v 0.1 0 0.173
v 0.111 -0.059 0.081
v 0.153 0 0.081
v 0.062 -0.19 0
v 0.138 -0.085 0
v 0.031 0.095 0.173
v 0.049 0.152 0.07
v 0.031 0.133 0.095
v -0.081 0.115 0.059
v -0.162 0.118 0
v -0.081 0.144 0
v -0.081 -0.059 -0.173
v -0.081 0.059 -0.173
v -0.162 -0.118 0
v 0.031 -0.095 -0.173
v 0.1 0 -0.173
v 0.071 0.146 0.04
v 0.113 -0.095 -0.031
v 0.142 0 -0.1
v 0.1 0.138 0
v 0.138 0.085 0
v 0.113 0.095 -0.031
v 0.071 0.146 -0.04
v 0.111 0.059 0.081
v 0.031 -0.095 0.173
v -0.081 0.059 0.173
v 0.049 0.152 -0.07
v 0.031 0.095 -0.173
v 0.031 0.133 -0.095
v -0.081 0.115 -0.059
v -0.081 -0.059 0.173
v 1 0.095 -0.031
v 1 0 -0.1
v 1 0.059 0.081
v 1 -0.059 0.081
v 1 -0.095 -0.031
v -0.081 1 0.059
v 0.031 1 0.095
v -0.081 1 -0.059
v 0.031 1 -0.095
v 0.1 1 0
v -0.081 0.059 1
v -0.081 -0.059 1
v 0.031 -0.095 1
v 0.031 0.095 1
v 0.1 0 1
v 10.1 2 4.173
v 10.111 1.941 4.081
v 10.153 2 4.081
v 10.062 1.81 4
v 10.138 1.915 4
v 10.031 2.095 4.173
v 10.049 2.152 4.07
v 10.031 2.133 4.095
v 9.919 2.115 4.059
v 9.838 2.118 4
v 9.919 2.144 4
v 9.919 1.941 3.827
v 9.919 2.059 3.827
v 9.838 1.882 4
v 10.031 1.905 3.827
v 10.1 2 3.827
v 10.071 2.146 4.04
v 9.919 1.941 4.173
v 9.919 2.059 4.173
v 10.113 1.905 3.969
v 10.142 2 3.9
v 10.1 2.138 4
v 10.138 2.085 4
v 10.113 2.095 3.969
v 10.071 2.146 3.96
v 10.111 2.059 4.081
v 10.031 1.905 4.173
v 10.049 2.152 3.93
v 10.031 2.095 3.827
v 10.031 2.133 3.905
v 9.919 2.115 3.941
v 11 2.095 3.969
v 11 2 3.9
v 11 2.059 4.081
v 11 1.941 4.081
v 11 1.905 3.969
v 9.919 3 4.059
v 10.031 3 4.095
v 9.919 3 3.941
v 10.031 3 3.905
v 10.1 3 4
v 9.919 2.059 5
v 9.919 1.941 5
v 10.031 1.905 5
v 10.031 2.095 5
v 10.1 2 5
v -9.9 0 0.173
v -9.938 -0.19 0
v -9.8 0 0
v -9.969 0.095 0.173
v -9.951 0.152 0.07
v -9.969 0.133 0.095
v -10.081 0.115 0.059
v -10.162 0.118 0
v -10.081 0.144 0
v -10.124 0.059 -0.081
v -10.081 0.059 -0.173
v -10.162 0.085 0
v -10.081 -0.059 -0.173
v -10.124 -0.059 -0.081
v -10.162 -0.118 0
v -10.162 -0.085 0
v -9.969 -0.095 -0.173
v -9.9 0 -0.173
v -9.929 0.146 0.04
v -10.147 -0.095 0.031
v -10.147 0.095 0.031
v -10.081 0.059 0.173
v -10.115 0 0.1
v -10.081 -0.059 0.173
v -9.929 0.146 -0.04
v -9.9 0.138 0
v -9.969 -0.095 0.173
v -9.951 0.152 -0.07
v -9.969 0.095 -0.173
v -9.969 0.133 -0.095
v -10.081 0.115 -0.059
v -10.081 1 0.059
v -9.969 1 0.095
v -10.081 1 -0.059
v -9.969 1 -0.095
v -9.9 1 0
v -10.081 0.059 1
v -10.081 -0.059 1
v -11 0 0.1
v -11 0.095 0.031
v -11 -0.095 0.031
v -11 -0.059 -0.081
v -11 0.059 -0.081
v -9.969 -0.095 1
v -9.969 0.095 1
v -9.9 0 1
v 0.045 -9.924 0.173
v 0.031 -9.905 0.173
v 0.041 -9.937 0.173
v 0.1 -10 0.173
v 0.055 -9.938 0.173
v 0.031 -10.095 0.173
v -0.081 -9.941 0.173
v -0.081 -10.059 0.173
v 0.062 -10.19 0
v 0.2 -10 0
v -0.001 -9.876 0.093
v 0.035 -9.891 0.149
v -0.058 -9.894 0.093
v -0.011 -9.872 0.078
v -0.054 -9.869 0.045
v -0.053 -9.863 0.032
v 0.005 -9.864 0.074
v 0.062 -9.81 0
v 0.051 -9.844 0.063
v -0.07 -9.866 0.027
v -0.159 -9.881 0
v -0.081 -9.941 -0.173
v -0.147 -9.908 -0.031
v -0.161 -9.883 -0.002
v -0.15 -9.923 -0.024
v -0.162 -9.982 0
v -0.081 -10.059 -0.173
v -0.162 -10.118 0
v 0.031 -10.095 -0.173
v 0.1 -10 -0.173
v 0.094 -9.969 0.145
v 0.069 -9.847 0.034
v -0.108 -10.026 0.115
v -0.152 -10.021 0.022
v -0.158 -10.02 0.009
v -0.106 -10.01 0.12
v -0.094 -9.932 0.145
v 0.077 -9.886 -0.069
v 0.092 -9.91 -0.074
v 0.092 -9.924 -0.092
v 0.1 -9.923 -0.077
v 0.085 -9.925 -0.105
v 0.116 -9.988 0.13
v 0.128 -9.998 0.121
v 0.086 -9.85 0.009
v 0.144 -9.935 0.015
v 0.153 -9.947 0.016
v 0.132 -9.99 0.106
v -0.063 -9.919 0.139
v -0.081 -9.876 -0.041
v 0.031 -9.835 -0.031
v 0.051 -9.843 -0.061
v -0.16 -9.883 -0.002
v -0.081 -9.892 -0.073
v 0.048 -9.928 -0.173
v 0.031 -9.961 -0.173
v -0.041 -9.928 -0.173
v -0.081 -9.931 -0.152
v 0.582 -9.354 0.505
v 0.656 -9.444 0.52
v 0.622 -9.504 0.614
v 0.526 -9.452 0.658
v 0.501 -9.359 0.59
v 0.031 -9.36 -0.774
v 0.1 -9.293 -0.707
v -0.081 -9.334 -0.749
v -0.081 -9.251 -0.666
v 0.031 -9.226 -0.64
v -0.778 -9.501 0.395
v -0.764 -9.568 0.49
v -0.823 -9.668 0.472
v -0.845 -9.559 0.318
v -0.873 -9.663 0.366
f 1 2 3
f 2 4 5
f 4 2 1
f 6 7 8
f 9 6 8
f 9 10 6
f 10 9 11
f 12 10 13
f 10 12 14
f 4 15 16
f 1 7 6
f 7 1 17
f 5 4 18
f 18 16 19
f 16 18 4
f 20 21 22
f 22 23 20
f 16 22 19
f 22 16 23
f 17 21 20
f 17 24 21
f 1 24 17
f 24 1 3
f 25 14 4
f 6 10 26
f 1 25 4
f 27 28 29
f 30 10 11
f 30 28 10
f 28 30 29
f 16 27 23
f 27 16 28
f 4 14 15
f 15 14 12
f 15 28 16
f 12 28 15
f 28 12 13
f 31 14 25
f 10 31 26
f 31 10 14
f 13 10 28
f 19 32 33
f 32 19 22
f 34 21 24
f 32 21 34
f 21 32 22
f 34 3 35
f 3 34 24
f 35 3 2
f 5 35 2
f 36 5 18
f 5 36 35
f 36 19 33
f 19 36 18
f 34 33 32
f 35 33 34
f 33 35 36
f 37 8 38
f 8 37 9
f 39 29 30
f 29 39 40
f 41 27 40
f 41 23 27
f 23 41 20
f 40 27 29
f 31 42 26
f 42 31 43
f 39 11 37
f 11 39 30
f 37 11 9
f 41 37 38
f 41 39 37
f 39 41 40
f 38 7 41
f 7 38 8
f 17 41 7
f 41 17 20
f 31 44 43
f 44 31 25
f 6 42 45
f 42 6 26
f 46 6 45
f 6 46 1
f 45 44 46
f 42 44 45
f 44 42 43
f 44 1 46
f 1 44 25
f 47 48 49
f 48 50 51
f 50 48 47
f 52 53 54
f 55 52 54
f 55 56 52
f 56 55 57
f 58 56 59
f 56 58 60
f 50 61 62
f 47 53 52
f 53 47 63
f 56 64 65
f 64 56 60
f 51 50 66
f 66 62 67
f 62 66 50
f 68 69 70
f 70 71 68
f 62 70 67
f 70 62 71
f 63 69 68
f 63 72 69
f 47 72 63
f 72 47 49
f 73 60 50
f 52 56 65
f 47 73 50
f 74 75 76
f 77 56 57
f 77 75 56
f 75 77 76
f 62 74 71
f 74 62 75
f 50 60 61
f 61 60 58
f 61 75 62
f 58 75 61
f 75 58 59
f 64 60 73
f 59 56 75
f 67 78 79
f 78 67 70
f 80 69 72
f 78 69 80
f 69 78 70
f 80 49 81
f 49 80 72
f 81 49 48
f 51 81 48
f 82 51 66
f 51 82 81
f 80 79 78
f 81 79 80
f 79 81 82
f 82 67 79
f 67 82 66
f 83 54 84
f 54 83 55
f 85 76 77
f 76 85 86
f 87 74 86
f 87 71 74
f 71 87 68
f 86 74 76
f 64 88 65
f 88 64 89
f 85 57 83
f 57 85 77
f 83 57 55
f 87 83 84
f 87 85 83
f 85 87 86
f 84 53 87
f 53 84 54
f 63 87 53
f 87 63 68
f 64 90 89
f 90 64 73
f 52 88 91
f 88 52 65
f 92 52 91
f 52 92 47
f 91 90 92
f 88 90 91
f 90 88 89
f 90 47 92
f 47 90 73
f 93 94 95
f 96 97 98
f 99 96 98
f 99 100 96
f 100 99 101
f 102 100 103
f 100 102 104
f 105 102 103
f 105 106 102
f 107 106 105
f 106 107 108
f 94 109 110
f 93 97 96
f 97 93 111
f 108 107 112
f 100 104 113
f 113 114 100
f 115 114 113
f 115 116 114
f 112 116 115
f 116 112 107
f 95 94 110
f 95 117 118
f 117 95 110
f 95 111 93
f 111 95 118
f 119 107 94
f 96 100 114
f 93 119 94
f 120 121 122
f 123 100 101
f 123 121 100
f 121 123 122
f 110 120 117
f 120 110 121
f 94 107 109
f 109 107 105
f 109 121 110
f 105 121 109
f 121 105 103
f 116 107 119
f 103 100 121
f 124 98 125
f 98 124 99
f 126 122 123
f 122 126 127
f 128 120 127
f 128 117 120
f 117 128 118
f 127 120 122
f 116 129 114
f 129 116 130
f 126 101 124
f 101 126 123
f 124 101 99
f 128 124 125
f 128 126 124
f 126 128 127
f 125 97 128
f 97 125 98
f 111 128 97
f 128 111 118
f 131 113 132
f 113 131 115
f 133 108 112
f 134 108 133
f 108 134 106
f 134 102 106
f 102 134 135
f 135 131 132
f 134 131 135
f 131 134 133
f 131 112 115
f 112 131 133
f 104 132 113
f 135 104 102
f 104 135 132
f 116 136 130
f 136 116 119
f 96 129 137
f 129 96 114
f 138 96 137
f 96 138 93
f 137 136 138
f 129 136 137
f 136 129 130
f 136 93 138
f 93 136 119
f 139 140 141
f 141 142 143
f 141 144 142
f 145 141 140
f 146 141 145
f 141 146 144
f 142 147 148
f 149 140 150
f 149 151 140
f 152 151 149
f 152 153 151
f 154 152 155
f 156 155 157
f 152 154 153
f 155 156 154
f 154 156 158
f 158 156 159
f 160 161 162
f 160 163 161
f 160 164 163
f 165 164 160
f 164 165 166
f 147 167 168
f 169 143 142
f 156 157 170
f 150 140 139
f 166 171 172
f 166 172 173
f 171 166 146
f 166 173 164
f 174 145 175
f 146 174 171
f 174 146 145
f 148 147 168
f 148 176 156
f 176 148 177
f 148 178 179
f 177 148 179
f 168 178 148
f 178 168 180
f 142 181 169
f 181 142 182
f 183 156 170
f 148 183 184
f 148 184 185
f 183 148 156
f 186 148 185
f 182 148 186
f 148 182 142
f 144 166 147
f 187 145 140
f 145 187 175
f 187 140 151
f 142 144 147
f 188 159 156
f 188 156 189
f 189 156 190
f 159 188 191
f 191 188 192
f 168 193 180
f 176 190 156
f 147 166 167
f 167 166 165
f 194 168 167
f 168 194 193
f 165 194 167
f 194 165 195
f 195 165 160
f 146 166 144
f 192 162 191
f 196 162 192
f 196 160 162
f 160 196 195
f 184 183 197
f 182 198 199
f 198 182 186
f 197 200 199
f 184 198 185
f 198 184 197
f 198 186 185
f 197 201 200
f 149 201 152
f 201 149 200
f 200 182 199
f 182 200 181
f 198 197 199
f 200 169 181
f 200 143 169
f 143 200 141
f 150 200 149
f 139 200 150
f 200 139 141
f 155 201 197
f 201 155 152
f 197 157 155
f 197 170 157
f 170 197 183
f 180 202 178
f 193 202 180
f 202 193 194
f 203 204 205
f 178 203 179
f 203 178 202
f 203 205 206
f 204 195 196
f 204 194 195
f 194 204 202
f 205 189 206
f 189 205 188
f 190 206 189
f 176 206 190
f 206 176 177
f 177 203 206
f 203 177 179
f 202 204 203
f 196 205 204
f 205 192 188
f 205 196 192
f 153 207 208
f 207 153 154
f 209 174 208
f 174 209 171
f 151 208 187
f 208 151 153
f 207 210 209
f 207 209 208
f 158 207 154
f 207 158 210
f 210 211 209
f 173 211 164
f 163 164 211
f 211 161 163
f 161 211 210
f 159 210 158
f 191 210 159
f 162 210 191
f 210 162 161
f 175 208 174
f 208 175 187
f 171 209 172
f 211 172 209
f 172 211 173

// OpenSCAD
// file: local.scad
//a few utility functions
function norm(a) = sqrt(a*a);
function unit_vector(v) = v/norm(v);
function clamp(v,lower_bound,upper_bound) = min(max(v,lower_bound),upper_bound);
function cross_product(a,b) = [
	a[1]*b[2]-a[2]*b[1],
	a[2]*b[0]-a[0]*b[2],
	a[0]*b[1]-a[1]*b[0]
];

//works for both numbers and vectors
function almost_equal(number, ref, tol) = sqrt((number-ref)*(number-ref)) < tol;

function _rotation_angle(a,b) = (a*b > 0) ? 
	asin(clamp(norm(cross_product(b,a))/norm(a)/norm(b),-1,1)) :
	180 - asin(clamp(norm(cross_product(b,a))/norm(a)/norm(b),-1,1));

//The (non-unit) rotation axis and angle around which a has to be rotated to be colinear to b
function calculate_rotation_axis(a,b) =
	//if the two vectors are not colinear find a rotation axis using the cross product
	(norm(cross_product(b,a)) != 0) ? [unit_vector(cross_product(b,a)),_rotation_angle(a,b)] :
	//if they are colinear and do not lie in the yz plane, choose the rotation axis from the yz plane
	(a*[1,0,0] < 0) ? [unit_vector([0,-a[1],+a[0]]),acos(clamp(a*b/norm(a)/norm(b),-1,1))] :
	(a*[1,0,0] > 0) ? [unit_vector([0,+a[1],-a[0]]),acos(clamp(a*b/norm(a)/norm(b),-1,1))] :
	//otherwise use the x axis
	[[1,0,0],acos(clamp(a*b/norm(a)/norm(b),-1,1))];

function calculate_axes(x,y) = [unit_vector(x),unit_vector(y), unit_vector(cross_product(x,y))];

function new_cs(origin=[0,0,0],axes=[[1,0,0],[0,1,0],[0,0,1]]) = (len(axes) == 2) ?
	[origin,calculate_axes(axes[0],axes[1])] :
	is_orthonormal([origin,axes]) ?
		[origin,axes] :
		"Error: Axes are not orthonormal";

function is_orthonormal(cs,tol=1e-3) =
	(almost_equal(norm(cs[1][0]),1,tol)) &&
	(almost_equal(norm(cs[1][1]),1,tol)) &&
	(almost_equal(norm(cs[1][2]),1,tol)) &&
	(almost_equal(cross_product(cs[1][0],cs[1][1]),cs[1][2],tol)) &&
	(almost_equal(cross_product(cs[1][1],cs[1][2]),cs[1][0],tol)) &&
	(almost_equal(cross_product(cs[1][2],cs[1][0]),cs[1][1],tol));

function unit_matrix3() = [
[1,0,0],
[0,1,0],
[0,0,1]];

function tensor_product_matrix3(u,v) = [
[u[0]*v[0], u[0]*v[1], u[0]*v[2]],
[u[1]*v[0], u[1]*v[1], u[1]*v[2]],
[u[2]*v[0], u[2]*v[1], u[2]*v[2]]];

function cross_product_matrix3(v) = [
[   0 , -v[2], +v[1]],
[+v[2],    0 , -v[0]],
[-v[1],  v[0],    0 ]];

function rotation_matrix3(n,angle) =
	cos(angle)*unit_matrix3() +
	sin(angle)*cross_product_matrix3(n) +
	(1-cos(angle))*tensor_product_matrix3(n,n);

//the modules are used directly by the user
module show_cs(cs){
	origin = cs[0];
	axes = cs[1];
	x_rot = calculate_rotation_axis(axes[0],[0,0,1]);
	y_rot = calculate_rotation_axis(axes[1],[0,0,1]);
	z_rot = calculate_rotation_axis(axes[2],[0,0,1]);
	translate(origin){
		color("Gray") sphere(0.2);
		rotate(x_rot[1],x_rot[0]) color("Red") cylinder(r=0.1,h=norm(axes[0]));
		rotate(y_rot[1],y_rot[0]) color("Green") cylinder(r=0.1,h=norm(axes[1]));
		rotate(z_rot[1],z_rot[0]) color("Blue") cylinder(r=0.1,h=norm(axes[2]));
	}
}

module translate_local(cs,v=[0,0,0]){
	origin = cs[0];
	axes = cs[1];
	x_rot = calculate_rotation_axis(axes[0],[1,0,0]);
	y_rot = calculate_rotation_axis(axes[1],
		rotation_matrix3(x_rot[0],x_rot[1])*[0,1,0]);
	translate(origin+v*axes){
		//align y axes
		rotate(y_rot[1],y_rot[0]){
			//align x axes
			rotate(x_rot[1],x_rot[0]){
				child(0);
			}
		}
	}
}

module in_cs(cs){
	origin = cs[0];
	axes = cs[1];
	x_rot = calculate_rotation_axis(axes[0],[1,0,0]);
	y_rot = calculate_rotation_axis(axes[1],
		rotation_matrix3(x_rot[0],x_rot[1])*[0,1,0]);
	translate(origin){
		//align y axes
		rotate(y_rot[1],y_rot[0]){
			//align x axes
			rotate(x_rot[1],x_rot[0]){
				child(0);
			}
		}
	}
}

module align(cs, cs_dst, displacement){
	x_rot = calculate_rotation_axis(cs[1][0],cs_dst[1][0]);
	y_rot = _rotation_angle(cs[1][1],
		rotation_matrix3(x_rot[0],x_rot[1])*cs_dst[1][1]);
	echo(y_rot);
	translate(cs_dst[0])
		//align y axes
		rotate(-y_rot,cs[1][0])
			//align x axes
			rotate(x_rot[1],x_rot[0])
				translate(-cs[0]+displacement)
					child(0);
}
// main file
use <local.scad>

//create and show new coordinate systems
global = new_cs();
shifted = new_cs(origin=[10,2,4]);
rotated = new_cs(origin=[-10,0,0],axes=[[0,1,0],[-1,0,0],[0,0,1]]);
rotated2 = new_cs(origin=[0,-10,0],axes=[[1,1,1],[0,1,-1]]);
rotated3 = new_cs(origin=[0,-10,0],axes=[[1,1,1],[1,-1,0]]);


show_cs(global);
show_cs(shifted);
show_cs(rotated);
show_cs(rotated2);
